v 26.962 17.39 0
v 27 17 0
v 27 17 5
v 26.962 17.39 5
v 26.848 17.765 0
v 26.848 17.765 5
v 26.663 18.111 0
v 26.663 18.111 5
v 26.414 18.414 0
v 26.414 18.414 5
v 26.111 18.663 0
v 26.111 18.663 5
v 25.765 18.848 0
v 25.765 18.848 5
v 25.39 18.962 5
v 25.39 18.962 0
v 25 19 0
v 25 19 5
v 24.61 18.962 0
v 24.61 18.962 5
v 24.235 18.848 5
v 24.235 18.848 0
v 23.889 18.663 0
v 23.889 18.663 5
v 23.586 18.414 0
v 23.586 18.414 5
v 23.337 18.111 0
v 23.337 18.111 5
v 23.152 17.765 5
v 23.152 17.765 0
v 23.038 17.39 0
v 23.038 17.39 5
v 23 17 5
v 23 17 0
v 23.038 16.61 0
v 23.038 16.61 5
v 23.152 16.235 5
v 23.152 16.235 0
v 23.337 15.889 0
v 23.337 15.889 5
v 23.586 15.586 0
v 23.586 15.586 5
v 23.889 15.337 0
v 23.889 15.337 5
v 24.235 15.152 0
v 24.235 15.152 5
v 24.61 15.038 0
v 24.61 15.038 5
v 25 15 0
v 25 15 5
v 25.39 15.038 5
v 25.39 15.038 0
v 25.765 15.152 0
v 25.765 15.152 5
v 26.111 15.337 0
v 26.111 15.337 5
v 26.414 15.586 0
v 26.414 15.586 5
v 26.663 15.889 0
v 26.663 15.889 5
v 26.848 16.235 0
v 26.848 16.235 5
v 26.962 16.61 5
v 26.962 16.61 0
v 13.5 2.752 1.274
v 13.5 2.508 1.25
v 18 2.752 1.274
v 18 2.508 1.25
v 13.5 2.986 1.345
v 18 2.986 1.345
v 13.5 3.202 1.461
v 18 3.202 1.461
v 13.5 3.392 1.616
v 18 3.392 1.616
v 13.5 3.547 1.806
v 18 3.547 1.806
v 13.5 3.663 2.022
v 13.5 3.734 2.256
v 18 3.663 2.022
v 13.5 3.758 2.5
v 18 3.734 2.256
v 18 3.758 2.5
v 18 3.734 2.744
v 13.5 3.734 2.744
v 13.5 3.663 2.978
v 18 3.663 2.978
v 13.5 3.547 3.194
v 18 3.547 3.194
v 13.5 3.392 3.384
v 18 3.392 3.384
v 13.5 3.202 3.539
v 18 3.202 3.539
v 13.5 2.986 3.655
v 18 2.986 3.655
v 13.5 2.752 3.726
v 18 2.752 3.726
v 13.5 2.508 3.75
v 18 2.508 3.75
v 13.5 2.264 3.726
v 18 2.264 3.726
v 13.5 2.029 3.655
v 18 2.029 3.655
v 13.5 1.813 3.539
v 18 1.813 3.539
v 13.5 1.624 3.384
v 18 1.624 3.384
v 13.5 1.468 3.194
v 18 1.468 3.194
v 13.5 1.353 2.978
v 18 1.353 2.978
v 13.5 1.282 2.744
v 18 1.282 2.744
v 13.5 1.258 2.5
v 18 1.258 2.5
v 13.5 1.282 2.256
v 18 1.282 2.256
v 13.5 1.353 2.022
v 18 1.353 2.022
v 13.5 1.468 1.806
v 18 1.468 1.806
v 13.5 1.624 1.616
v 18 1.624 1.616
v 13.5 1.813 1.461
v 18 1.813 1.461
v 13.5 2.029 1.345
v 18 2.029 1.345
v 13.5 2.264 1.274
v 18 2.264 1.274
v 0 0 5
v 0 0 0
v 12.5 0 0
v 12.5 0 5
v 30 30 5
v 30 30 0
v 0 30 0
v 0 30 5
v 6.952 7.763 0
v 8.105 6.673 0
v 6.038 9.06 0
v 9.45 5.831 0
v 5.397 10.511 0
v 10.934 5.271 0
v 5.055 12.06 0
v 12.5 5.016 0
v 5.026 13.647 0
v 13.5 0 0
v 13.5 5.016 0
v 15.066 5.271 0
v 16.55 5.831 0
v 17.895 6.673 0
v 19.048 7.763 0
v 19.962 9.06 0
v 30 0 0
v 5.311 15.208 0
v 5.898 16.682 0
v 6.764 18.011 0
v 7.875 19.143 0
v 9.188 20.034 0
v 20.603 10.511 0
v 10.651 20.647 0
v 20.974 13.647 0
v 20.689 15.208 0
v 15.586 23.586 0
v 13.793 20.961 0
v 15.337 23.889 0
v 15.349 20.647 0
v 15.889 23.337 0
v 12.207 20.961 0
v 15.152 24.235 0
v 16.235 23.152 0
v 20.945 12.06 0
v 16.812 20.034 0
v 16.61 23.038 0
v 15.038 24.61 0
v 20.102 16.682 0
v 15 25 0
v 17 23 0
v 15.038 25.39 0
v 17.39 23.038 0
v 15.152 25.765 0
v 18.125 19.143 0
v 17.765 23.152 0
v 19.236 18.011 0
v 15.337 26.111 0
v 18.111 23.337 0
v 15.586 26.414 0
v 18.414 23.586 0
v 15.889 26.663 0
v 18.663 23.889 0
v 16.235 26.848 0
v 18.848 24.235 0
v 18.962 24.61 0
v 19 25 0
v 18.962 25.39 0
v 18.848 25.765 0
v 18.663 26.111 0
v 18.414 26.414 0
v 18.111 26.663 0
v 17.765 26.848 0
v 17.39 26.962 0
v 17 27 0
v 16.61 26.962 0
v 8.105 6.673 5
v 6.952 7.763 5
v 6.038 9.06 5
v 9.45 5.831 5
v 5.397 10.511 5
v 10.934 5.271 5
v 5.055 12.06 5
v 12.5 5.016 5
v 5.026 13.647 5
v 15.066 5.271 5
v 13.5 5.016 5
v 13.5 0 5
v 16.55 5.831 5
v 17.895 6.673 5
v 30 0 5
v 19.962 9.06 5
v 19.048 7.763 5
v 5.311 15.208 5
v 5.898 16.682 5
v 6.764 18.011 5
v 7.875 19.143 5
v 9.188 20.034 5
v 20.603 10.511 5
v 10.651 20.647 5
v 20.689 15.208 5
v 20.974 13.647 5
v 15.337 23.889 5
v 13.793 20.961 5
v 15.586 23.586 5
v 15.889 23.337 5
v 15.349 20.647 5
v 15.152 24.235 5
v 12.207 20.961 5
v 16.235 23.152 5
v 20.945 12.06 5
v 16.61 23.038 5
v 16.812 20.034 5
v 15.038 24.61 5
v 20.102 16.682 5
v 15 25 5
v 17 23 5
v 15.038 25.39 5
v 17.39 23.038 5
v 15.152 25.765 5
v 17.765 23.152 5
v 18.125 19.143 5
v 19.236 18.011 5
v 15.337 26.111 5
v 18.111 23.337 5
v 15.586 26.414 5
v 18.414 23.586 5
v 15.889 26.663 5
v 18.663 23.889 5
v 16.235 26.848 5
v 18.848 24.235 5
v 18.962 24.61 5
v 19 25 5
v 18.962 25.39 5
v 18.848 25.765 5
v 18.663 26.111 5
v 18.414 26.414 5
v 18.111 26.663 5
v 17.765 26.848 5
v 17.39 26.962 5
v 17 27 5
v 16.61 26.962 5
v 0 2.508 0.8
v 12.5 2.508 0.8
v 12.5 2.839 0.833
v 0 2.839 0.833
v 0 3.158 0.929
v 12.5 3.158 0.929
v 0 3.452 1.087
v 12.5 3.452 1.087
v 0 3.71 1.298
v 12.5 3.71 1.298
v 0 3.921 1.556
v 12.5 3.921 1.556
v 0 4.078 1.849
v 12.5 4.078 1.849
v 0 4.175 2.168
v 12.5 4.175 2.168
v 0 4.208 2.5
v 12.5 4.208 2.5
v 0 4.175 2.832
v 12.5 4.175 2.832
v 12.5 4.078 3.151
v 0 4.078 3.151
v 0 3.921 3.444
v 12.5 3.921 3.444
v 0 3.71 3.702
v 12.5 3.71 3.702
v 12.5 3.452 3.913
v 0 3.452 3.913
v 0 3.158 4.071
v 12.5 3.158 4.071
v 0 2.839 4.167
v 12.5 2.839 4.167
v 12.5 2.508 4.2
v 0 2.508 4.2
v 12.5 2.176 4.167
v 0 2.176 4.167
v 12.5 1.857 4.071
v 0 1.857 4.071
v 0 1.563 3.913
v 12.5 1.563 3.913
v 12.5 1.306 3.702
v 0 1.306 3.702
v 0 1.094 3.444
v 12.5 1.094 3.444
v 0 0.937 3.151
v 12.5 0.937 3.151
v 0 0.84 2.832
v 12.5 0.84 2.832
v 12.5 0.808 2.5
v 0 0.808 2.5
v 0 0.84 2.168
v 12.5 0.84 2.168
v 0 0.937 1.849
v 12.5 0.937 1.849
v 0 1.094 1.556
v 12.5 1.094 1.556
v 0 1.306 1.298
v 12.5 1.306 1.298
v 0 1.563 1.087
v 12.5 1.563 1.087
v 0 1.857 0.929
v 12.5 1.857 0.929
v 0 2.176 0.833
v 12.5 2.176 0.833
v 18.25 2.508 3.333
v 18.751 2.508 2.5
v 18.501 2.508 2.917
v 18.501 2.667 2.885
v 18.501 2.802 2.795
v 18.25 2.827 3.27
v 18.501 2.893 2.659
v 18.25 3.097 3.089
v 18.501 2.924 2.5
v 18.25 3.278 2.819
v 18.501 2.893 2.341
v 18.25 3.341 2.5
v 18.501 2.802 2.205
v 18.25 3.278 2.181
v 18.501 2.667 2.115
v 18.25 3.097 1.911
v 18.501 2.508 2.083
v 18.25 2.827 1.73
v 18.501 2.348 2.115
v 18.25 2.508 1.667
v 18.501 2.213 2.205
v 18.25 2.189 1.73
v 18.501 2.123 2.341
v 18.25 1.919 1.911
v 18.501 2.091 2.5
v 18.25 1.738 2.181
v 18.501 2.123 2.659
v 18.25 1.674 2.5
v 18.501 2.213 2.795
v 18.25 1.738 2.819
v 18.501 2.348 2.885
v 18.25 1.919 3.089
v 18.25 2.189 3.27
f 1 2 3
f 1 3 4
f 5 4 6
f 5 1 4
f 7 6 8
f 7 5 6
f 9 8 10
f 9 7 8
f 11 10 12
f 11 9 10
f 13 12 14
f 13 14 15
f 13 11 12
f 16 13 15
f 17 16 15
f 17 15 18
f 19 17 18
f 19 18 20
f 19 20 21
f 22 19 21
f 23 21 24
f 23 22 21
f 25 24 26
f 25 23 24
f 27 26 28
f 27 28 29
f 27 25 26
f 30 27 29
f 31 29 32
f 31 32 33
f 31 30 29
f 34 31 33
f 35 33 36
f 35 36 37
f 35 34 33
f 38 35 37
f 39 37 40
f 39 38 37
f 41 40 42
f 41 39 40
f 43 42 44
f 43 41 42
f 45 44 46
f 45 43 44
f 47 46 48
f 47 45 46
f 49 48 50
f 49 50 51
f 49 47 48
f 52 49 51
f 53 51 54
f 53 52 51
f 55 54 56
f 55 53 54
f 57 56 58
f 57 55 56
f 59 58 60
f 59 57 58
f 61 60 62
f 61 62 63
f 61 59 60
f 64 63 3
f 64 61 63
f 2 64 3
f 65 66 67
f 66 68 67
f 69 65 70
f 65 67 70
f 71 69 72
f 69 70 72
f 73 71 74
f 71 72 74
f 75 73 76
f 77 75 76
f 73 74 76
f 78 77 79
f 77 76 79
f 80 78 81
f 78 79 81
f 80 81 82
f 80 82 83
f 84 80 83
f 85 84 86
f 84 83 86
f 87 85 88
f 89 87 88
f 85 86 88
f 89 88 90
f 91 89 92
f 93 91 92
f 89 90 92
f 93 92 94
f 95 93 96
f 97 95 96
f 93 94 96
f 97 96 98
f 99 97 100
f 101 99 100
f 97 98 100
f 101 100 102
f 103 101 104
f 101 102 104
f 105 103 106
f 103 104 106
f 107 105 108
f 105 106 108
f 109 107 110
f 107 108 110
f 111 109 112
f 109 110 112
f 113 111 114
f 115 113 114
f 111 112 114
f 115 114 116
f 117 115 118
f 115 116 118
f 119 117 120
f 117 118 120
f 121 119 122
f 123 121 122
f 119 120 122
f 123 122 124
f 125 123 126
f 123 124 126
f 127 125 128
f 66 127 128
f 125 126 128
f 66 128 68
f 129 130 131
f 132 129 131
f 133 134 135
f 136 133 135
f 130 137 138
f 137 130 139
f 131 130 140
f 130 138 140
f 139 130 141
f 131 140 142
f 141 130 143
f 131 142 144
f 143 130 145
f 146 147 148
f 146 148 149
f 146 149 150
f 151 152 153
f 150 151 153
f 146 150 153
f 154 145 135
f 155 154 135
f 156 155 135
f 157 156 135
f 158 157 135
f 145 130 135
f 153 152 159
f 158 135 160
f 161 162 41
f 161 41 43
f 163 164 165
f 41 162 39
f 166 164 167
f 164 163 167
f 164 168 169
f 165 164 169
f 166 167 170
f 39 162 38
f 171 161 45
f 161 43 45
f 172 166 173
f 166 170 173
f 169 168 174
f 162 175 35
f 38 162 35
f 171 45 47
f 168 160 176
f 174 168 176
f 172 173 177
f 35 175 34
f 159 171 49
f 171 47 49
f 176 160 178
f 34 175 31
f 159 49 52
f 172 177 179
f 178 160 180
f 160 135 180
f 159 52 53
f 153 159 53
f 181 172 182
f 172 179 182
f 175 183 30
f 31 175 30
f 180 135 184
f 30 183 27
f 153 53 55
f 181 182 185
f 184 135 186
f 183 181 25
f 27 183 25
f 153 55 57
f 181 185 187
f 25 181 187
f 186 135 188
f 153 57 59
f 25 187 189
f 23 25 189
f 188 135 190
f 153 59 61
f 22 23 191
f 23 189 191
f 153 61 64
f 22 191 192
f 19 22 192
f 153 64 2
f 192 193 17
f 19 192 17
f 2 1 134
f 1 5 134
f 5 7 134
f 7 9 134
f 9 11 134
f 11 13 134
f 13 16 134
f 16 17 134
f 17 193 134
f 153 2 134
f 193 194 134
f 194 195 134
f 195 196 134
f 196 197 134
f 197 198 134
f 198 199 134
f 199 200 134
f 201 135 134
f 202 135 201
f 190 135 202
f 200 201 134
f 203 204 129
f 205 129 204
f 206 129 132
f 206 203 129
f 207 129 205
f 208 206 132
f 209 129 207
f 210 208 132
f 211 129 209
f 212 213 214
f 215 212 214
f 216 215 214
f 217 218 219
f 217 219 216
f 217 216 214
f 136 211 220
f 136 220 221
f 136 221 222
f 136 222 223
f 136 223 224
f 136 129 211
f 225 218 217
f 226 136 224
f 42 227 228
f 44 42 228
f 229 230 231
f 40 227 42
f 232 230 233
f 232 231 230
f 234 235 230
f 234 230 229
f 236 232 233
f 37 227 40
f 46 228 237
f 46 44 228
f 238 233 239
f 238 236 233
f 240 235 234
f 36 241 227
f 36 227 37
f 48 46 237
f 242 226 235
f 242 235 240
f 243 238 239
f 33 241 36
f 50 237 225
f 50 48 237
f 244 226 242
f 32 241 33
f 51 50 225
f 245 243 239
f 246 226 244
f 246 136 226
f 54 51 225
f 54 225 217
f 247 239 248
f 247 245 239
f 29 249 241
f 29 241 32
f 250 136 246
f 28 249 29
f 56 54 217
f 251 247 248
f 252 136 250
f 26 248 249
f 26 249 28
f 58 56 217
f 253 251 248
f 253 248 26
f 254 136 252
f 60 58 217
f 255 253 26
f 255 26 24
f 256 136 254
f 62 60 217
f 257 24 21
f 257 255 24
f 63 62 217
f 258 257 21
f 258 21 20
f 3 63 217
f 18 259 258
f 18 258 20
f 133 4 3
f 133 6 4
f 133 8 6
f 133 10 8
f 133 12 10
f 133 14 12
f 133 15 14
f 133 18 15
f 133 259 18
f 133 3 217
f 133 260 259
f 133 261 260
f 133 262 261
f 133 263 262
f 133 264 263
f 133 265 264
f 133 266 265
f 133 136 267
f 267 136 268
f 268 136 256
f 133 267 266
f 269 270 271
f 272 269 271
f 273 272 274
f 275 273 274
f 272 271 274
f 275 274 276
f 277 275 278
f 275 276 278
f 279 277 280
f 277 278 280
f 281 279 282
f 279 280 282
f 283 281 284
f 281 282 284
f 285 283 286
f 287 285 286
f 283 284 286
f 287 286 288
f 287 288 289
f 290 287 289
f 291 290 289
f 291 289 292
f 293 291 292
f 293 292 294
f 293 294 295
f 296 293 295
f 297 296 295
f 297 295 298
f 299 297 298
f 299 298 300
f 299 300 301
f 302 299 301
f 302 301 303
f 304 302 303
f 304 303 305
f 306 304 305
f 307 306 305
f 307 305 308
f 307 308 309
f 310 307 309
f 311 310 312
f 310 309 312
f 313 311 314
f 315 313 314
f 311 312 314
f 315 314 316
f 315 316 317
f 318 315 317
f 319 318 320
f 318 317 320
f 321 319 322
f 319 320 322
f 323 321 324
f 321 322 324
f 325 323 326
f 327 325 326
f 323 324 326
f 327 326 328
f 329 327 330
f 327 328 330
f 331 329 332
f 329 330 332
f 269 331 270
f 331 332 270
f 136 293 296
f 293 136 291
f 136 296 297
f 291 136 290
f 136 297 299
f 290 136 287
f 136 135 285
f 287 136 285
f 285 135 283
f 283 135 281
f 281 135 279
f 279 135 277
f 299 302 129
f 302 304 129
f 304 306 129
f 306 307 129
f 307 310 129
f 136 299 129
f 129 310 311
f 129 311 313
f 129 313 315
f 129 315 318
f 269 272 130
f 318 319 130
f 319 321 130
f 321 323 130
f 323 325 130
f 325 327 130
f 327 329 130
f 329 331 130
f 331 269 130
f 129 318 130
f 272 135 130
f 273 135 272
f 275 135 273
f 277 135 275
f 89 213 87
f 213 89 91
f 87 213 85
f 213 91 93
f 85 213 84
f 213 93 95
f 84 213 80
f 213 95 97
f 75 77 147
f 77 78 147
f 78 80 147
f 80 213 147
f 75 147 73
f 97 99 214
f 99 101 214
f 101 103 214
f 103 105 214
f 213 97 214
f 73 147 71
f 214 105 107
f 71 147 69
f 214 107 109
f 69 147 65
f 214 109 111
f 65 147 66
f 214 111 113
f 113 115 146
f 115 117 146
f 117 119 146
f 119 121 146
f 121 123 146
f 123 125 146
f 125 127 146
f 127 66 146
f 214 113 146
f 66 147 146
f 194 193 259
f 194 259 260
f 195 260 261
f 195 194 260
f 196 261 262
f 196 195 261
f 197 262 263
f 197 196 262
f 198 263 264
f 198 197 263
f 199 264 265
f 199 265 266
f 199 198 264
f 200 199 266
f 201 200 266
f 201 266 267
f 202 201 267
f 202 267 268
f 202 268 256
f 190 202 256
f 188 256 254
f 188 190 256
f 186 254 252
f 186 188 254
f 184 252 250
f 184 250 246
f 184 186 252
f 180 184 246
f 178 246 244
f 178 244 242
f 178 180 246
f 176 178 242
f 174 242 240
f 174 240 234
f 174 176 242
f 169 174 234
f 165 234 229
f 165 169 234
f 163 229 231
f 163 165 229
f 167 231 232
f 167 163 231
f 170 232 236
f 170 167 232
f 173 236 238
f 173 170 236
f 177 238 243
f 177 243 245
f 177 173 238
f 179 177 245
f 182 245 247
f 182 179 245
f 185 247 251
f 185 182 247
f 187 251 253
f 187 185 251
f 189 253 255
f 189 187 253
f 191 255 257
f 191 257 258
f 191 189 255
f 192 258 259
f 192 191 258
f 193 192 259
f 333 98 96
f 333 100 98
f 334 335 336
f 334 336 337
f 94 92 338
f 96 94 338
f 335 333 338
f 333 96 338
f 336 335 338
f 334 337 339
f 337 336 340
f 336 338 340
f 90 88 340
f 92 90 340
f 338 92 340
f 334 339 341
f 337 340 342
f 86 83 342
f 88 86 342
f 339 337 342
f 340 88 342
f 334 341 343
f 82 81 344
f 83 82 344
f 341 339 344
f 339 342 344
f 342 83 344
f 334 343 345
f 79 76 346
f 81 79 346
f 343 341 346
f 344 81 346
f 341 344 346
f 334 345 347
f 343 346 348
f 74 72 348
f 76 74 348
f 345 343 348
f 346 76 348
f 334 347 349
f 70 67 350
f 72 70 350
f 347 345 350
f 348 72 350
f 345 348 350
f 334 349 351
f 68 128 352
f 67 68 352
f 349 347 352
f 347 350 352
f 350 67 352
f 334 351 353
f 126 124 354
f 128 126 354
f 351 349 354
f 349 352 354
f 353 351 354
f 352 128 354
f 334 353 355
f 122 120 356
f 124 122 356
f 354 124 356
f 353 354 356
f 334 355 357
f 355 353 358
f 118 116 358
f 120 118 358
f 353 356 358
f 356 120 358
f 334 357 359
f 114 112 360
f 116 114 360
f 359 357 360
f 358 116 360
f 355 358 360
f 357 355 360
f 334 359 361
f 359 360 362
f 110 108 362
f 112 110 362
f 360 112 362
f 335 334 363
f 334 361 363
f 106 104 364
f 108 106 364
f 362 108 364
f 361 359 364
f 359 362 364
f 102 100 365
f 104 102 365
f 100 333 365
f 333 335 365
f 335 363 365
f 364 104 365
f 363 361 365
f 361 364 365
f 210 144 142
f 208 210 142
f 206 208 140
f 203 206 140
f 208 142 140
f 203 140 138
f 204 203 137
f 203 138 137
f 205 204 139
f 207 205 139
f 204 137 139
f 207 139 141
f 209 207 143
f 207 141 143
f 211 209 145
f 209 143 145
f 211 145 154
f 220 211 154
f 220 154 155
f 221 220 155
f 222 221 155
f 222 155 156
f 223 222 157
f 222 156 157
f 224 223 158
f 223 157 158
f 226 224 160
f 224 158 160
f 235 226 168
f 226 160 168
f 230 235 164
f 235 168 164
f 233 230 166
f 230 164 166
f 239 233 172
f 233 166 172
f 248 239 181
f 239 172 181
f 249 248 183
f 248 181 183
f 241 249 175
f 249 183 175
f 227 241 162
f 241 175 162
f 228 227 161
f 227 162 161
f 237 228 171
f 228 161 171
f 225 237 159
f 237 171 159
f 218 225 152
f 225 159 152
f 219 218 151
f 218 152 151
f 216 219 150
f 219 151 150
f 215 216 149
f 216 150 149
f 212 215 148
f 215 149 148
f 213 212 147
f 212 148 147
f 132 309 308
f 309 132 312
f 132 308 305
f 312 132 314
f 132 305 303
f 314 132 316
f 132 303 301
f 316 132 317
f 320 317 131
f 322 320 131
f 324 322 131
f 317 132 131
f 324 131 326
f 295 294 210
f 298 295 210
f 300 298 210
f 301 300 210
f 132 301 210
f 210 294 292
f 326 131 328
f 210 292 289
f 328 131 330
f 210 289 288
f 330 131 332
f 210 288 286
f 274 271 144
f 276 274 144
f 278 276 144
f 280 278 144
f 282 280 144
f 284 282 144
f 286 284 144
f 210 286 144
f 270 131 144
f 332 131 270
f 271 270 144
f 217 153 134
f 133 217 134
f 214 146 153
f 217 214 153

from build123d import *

# Parameters (mm, degrees)
SCHIZZO1_R                   = 2
ESTRUSIONE_ESTRUSIONE1_DEPTH = 5
FORO_PER_VITE_M3_1_D         = 3.4
FORO_PER_VITE_M3_1_DEPTH     = 12.5
FORO_FILETTATO_M3_1_D        = 2.5
FORO_FILETTATO_M3_1_DEPTH    = 4.5
FORO_FILETTATO_M3_1_TIP      = 0.751075774


with BuildPart() as part:
    # Schizzo1 → Estrusione-Estrusione1 (new body)
    with BuildSketch(Plane.XY):
        with BuildLine():
            Line((0, 30), (0, 0))
            Line((0, 0), (12.5, 0))
            Line((12.5, 0), (12.5, 5.015640289))
            ThreePointArc((12.5, 5.015640289), (13, 21), (13.5, 5.015640289))
            Line((13.5, 5.015640289), (13.5, 0))
            Line((13.5, 0), (30, 0))
            Line((30, 0), (30, 30))
            Line((30, 30), (0, 30))
        make_face()
        with Locations((25, 17)):
            Circle(SCHIZZO1_R, mode=Mode.SUBTRACT)
        with Locations((17, 25)):
            Circle(SCHIZZO1_R, mode=Mode.SUBTRACT)
    extrude(amount=ESTRUSIONE_ESTRUSIONE1_DEPTH)

    # Foro per Vite M3-1
    with Locations(Plane.ZY):
        with Locations((2.5, 2.507820144)):
            Hole(FORO_PER_VITE_M3_1_D / 2, depth=FORO_PER_VITE_M3_1_DEPTH)

    # Foro filettato M3-1
    with Locations(Plane.ZY.offset(-13.5)):
        with Locations((2.5, 2.507820144)):
            Hole(FORO_FILETTATO_M3_1_D / 2, depth=FORO_FILETTATO_M3_1_DEPTH)
            with Locations((0, 0, -(FORO_FILETTATO_M3_1_DEPTH + FORO_FILETTATO_M3_1_TIP / 2))):  # 118° drill point
                Cone(0, FORO_FILETTATO_M3_1_D / 2, FORO_FILETTATO_M3_1_TIP, mode=Mode.SUBTRACT)


solid = part.part
